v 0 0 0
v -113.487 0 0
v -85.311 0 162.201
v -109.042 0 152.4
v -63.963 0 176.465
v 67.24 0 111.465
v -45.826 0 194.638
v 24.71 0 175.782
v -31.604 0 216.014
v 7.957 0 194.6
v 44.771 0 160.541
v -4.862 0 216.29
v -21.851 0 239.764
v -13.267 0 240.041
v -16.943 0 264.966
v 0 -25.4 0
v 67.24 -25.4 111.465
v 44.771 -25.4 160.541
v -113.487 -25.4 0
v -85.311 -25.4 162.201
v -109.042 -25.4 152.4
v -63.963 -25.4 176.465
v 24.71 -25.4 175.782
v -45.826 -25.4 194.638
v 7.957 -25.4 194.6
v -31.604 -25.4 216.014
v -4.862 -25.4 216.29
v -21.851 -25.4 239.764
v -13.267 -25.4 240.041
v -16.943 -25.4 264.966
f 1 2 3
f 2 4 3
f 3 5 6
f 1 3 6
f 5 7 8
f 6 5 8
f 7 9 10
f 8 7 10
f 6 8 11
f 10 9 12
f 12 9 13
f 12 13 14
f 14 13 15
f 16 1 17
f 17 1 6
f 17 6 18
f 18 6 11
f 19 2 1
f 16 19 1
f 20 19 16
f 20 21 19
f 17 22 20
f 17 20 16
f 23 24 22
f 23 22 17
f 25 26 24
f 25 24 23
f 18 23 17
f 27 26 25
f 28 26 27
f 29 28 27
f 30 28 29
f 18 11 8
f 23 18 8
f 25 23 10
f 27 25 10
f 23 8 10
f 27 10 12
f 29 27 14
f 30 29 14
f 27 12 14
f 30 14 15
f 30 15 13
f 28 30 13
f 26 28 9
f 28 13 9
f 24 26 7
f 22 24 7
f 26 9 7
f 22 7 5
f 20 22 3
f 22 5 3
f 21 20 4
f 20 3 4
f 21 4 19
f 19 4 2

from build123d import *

# Parameters (mm, degrees)
F1_DEPTH = 25.4


with BuildPart() as f1:
    # F0 (on Front) → F1 (new body)
    with BuildSketch(Plane.XZ):
        with BuildLine():
            Line((-113.4872, 0), (-109.0422, 0))
            Line((-109.0422, 0), (0, 0))
            Line((0, 0), (67.239726, 111.464568))
            Line((67.239726, 111.464568), (44.77097, 160.540587))
            ThreePointArc((44.77097, 160.540587), (1.021835, 205.134265), (-16.943187, 264.966037))
            ThreePointArc((-16.943187, 264.966037), (-45.82596, 194.637581), (-109.0422, 152.4))
            Line((-109.0422, 152.4), (-113.4872, 0))
        make_face()
    extrude(amount=F1_DEPTH)


solid = f1.part
